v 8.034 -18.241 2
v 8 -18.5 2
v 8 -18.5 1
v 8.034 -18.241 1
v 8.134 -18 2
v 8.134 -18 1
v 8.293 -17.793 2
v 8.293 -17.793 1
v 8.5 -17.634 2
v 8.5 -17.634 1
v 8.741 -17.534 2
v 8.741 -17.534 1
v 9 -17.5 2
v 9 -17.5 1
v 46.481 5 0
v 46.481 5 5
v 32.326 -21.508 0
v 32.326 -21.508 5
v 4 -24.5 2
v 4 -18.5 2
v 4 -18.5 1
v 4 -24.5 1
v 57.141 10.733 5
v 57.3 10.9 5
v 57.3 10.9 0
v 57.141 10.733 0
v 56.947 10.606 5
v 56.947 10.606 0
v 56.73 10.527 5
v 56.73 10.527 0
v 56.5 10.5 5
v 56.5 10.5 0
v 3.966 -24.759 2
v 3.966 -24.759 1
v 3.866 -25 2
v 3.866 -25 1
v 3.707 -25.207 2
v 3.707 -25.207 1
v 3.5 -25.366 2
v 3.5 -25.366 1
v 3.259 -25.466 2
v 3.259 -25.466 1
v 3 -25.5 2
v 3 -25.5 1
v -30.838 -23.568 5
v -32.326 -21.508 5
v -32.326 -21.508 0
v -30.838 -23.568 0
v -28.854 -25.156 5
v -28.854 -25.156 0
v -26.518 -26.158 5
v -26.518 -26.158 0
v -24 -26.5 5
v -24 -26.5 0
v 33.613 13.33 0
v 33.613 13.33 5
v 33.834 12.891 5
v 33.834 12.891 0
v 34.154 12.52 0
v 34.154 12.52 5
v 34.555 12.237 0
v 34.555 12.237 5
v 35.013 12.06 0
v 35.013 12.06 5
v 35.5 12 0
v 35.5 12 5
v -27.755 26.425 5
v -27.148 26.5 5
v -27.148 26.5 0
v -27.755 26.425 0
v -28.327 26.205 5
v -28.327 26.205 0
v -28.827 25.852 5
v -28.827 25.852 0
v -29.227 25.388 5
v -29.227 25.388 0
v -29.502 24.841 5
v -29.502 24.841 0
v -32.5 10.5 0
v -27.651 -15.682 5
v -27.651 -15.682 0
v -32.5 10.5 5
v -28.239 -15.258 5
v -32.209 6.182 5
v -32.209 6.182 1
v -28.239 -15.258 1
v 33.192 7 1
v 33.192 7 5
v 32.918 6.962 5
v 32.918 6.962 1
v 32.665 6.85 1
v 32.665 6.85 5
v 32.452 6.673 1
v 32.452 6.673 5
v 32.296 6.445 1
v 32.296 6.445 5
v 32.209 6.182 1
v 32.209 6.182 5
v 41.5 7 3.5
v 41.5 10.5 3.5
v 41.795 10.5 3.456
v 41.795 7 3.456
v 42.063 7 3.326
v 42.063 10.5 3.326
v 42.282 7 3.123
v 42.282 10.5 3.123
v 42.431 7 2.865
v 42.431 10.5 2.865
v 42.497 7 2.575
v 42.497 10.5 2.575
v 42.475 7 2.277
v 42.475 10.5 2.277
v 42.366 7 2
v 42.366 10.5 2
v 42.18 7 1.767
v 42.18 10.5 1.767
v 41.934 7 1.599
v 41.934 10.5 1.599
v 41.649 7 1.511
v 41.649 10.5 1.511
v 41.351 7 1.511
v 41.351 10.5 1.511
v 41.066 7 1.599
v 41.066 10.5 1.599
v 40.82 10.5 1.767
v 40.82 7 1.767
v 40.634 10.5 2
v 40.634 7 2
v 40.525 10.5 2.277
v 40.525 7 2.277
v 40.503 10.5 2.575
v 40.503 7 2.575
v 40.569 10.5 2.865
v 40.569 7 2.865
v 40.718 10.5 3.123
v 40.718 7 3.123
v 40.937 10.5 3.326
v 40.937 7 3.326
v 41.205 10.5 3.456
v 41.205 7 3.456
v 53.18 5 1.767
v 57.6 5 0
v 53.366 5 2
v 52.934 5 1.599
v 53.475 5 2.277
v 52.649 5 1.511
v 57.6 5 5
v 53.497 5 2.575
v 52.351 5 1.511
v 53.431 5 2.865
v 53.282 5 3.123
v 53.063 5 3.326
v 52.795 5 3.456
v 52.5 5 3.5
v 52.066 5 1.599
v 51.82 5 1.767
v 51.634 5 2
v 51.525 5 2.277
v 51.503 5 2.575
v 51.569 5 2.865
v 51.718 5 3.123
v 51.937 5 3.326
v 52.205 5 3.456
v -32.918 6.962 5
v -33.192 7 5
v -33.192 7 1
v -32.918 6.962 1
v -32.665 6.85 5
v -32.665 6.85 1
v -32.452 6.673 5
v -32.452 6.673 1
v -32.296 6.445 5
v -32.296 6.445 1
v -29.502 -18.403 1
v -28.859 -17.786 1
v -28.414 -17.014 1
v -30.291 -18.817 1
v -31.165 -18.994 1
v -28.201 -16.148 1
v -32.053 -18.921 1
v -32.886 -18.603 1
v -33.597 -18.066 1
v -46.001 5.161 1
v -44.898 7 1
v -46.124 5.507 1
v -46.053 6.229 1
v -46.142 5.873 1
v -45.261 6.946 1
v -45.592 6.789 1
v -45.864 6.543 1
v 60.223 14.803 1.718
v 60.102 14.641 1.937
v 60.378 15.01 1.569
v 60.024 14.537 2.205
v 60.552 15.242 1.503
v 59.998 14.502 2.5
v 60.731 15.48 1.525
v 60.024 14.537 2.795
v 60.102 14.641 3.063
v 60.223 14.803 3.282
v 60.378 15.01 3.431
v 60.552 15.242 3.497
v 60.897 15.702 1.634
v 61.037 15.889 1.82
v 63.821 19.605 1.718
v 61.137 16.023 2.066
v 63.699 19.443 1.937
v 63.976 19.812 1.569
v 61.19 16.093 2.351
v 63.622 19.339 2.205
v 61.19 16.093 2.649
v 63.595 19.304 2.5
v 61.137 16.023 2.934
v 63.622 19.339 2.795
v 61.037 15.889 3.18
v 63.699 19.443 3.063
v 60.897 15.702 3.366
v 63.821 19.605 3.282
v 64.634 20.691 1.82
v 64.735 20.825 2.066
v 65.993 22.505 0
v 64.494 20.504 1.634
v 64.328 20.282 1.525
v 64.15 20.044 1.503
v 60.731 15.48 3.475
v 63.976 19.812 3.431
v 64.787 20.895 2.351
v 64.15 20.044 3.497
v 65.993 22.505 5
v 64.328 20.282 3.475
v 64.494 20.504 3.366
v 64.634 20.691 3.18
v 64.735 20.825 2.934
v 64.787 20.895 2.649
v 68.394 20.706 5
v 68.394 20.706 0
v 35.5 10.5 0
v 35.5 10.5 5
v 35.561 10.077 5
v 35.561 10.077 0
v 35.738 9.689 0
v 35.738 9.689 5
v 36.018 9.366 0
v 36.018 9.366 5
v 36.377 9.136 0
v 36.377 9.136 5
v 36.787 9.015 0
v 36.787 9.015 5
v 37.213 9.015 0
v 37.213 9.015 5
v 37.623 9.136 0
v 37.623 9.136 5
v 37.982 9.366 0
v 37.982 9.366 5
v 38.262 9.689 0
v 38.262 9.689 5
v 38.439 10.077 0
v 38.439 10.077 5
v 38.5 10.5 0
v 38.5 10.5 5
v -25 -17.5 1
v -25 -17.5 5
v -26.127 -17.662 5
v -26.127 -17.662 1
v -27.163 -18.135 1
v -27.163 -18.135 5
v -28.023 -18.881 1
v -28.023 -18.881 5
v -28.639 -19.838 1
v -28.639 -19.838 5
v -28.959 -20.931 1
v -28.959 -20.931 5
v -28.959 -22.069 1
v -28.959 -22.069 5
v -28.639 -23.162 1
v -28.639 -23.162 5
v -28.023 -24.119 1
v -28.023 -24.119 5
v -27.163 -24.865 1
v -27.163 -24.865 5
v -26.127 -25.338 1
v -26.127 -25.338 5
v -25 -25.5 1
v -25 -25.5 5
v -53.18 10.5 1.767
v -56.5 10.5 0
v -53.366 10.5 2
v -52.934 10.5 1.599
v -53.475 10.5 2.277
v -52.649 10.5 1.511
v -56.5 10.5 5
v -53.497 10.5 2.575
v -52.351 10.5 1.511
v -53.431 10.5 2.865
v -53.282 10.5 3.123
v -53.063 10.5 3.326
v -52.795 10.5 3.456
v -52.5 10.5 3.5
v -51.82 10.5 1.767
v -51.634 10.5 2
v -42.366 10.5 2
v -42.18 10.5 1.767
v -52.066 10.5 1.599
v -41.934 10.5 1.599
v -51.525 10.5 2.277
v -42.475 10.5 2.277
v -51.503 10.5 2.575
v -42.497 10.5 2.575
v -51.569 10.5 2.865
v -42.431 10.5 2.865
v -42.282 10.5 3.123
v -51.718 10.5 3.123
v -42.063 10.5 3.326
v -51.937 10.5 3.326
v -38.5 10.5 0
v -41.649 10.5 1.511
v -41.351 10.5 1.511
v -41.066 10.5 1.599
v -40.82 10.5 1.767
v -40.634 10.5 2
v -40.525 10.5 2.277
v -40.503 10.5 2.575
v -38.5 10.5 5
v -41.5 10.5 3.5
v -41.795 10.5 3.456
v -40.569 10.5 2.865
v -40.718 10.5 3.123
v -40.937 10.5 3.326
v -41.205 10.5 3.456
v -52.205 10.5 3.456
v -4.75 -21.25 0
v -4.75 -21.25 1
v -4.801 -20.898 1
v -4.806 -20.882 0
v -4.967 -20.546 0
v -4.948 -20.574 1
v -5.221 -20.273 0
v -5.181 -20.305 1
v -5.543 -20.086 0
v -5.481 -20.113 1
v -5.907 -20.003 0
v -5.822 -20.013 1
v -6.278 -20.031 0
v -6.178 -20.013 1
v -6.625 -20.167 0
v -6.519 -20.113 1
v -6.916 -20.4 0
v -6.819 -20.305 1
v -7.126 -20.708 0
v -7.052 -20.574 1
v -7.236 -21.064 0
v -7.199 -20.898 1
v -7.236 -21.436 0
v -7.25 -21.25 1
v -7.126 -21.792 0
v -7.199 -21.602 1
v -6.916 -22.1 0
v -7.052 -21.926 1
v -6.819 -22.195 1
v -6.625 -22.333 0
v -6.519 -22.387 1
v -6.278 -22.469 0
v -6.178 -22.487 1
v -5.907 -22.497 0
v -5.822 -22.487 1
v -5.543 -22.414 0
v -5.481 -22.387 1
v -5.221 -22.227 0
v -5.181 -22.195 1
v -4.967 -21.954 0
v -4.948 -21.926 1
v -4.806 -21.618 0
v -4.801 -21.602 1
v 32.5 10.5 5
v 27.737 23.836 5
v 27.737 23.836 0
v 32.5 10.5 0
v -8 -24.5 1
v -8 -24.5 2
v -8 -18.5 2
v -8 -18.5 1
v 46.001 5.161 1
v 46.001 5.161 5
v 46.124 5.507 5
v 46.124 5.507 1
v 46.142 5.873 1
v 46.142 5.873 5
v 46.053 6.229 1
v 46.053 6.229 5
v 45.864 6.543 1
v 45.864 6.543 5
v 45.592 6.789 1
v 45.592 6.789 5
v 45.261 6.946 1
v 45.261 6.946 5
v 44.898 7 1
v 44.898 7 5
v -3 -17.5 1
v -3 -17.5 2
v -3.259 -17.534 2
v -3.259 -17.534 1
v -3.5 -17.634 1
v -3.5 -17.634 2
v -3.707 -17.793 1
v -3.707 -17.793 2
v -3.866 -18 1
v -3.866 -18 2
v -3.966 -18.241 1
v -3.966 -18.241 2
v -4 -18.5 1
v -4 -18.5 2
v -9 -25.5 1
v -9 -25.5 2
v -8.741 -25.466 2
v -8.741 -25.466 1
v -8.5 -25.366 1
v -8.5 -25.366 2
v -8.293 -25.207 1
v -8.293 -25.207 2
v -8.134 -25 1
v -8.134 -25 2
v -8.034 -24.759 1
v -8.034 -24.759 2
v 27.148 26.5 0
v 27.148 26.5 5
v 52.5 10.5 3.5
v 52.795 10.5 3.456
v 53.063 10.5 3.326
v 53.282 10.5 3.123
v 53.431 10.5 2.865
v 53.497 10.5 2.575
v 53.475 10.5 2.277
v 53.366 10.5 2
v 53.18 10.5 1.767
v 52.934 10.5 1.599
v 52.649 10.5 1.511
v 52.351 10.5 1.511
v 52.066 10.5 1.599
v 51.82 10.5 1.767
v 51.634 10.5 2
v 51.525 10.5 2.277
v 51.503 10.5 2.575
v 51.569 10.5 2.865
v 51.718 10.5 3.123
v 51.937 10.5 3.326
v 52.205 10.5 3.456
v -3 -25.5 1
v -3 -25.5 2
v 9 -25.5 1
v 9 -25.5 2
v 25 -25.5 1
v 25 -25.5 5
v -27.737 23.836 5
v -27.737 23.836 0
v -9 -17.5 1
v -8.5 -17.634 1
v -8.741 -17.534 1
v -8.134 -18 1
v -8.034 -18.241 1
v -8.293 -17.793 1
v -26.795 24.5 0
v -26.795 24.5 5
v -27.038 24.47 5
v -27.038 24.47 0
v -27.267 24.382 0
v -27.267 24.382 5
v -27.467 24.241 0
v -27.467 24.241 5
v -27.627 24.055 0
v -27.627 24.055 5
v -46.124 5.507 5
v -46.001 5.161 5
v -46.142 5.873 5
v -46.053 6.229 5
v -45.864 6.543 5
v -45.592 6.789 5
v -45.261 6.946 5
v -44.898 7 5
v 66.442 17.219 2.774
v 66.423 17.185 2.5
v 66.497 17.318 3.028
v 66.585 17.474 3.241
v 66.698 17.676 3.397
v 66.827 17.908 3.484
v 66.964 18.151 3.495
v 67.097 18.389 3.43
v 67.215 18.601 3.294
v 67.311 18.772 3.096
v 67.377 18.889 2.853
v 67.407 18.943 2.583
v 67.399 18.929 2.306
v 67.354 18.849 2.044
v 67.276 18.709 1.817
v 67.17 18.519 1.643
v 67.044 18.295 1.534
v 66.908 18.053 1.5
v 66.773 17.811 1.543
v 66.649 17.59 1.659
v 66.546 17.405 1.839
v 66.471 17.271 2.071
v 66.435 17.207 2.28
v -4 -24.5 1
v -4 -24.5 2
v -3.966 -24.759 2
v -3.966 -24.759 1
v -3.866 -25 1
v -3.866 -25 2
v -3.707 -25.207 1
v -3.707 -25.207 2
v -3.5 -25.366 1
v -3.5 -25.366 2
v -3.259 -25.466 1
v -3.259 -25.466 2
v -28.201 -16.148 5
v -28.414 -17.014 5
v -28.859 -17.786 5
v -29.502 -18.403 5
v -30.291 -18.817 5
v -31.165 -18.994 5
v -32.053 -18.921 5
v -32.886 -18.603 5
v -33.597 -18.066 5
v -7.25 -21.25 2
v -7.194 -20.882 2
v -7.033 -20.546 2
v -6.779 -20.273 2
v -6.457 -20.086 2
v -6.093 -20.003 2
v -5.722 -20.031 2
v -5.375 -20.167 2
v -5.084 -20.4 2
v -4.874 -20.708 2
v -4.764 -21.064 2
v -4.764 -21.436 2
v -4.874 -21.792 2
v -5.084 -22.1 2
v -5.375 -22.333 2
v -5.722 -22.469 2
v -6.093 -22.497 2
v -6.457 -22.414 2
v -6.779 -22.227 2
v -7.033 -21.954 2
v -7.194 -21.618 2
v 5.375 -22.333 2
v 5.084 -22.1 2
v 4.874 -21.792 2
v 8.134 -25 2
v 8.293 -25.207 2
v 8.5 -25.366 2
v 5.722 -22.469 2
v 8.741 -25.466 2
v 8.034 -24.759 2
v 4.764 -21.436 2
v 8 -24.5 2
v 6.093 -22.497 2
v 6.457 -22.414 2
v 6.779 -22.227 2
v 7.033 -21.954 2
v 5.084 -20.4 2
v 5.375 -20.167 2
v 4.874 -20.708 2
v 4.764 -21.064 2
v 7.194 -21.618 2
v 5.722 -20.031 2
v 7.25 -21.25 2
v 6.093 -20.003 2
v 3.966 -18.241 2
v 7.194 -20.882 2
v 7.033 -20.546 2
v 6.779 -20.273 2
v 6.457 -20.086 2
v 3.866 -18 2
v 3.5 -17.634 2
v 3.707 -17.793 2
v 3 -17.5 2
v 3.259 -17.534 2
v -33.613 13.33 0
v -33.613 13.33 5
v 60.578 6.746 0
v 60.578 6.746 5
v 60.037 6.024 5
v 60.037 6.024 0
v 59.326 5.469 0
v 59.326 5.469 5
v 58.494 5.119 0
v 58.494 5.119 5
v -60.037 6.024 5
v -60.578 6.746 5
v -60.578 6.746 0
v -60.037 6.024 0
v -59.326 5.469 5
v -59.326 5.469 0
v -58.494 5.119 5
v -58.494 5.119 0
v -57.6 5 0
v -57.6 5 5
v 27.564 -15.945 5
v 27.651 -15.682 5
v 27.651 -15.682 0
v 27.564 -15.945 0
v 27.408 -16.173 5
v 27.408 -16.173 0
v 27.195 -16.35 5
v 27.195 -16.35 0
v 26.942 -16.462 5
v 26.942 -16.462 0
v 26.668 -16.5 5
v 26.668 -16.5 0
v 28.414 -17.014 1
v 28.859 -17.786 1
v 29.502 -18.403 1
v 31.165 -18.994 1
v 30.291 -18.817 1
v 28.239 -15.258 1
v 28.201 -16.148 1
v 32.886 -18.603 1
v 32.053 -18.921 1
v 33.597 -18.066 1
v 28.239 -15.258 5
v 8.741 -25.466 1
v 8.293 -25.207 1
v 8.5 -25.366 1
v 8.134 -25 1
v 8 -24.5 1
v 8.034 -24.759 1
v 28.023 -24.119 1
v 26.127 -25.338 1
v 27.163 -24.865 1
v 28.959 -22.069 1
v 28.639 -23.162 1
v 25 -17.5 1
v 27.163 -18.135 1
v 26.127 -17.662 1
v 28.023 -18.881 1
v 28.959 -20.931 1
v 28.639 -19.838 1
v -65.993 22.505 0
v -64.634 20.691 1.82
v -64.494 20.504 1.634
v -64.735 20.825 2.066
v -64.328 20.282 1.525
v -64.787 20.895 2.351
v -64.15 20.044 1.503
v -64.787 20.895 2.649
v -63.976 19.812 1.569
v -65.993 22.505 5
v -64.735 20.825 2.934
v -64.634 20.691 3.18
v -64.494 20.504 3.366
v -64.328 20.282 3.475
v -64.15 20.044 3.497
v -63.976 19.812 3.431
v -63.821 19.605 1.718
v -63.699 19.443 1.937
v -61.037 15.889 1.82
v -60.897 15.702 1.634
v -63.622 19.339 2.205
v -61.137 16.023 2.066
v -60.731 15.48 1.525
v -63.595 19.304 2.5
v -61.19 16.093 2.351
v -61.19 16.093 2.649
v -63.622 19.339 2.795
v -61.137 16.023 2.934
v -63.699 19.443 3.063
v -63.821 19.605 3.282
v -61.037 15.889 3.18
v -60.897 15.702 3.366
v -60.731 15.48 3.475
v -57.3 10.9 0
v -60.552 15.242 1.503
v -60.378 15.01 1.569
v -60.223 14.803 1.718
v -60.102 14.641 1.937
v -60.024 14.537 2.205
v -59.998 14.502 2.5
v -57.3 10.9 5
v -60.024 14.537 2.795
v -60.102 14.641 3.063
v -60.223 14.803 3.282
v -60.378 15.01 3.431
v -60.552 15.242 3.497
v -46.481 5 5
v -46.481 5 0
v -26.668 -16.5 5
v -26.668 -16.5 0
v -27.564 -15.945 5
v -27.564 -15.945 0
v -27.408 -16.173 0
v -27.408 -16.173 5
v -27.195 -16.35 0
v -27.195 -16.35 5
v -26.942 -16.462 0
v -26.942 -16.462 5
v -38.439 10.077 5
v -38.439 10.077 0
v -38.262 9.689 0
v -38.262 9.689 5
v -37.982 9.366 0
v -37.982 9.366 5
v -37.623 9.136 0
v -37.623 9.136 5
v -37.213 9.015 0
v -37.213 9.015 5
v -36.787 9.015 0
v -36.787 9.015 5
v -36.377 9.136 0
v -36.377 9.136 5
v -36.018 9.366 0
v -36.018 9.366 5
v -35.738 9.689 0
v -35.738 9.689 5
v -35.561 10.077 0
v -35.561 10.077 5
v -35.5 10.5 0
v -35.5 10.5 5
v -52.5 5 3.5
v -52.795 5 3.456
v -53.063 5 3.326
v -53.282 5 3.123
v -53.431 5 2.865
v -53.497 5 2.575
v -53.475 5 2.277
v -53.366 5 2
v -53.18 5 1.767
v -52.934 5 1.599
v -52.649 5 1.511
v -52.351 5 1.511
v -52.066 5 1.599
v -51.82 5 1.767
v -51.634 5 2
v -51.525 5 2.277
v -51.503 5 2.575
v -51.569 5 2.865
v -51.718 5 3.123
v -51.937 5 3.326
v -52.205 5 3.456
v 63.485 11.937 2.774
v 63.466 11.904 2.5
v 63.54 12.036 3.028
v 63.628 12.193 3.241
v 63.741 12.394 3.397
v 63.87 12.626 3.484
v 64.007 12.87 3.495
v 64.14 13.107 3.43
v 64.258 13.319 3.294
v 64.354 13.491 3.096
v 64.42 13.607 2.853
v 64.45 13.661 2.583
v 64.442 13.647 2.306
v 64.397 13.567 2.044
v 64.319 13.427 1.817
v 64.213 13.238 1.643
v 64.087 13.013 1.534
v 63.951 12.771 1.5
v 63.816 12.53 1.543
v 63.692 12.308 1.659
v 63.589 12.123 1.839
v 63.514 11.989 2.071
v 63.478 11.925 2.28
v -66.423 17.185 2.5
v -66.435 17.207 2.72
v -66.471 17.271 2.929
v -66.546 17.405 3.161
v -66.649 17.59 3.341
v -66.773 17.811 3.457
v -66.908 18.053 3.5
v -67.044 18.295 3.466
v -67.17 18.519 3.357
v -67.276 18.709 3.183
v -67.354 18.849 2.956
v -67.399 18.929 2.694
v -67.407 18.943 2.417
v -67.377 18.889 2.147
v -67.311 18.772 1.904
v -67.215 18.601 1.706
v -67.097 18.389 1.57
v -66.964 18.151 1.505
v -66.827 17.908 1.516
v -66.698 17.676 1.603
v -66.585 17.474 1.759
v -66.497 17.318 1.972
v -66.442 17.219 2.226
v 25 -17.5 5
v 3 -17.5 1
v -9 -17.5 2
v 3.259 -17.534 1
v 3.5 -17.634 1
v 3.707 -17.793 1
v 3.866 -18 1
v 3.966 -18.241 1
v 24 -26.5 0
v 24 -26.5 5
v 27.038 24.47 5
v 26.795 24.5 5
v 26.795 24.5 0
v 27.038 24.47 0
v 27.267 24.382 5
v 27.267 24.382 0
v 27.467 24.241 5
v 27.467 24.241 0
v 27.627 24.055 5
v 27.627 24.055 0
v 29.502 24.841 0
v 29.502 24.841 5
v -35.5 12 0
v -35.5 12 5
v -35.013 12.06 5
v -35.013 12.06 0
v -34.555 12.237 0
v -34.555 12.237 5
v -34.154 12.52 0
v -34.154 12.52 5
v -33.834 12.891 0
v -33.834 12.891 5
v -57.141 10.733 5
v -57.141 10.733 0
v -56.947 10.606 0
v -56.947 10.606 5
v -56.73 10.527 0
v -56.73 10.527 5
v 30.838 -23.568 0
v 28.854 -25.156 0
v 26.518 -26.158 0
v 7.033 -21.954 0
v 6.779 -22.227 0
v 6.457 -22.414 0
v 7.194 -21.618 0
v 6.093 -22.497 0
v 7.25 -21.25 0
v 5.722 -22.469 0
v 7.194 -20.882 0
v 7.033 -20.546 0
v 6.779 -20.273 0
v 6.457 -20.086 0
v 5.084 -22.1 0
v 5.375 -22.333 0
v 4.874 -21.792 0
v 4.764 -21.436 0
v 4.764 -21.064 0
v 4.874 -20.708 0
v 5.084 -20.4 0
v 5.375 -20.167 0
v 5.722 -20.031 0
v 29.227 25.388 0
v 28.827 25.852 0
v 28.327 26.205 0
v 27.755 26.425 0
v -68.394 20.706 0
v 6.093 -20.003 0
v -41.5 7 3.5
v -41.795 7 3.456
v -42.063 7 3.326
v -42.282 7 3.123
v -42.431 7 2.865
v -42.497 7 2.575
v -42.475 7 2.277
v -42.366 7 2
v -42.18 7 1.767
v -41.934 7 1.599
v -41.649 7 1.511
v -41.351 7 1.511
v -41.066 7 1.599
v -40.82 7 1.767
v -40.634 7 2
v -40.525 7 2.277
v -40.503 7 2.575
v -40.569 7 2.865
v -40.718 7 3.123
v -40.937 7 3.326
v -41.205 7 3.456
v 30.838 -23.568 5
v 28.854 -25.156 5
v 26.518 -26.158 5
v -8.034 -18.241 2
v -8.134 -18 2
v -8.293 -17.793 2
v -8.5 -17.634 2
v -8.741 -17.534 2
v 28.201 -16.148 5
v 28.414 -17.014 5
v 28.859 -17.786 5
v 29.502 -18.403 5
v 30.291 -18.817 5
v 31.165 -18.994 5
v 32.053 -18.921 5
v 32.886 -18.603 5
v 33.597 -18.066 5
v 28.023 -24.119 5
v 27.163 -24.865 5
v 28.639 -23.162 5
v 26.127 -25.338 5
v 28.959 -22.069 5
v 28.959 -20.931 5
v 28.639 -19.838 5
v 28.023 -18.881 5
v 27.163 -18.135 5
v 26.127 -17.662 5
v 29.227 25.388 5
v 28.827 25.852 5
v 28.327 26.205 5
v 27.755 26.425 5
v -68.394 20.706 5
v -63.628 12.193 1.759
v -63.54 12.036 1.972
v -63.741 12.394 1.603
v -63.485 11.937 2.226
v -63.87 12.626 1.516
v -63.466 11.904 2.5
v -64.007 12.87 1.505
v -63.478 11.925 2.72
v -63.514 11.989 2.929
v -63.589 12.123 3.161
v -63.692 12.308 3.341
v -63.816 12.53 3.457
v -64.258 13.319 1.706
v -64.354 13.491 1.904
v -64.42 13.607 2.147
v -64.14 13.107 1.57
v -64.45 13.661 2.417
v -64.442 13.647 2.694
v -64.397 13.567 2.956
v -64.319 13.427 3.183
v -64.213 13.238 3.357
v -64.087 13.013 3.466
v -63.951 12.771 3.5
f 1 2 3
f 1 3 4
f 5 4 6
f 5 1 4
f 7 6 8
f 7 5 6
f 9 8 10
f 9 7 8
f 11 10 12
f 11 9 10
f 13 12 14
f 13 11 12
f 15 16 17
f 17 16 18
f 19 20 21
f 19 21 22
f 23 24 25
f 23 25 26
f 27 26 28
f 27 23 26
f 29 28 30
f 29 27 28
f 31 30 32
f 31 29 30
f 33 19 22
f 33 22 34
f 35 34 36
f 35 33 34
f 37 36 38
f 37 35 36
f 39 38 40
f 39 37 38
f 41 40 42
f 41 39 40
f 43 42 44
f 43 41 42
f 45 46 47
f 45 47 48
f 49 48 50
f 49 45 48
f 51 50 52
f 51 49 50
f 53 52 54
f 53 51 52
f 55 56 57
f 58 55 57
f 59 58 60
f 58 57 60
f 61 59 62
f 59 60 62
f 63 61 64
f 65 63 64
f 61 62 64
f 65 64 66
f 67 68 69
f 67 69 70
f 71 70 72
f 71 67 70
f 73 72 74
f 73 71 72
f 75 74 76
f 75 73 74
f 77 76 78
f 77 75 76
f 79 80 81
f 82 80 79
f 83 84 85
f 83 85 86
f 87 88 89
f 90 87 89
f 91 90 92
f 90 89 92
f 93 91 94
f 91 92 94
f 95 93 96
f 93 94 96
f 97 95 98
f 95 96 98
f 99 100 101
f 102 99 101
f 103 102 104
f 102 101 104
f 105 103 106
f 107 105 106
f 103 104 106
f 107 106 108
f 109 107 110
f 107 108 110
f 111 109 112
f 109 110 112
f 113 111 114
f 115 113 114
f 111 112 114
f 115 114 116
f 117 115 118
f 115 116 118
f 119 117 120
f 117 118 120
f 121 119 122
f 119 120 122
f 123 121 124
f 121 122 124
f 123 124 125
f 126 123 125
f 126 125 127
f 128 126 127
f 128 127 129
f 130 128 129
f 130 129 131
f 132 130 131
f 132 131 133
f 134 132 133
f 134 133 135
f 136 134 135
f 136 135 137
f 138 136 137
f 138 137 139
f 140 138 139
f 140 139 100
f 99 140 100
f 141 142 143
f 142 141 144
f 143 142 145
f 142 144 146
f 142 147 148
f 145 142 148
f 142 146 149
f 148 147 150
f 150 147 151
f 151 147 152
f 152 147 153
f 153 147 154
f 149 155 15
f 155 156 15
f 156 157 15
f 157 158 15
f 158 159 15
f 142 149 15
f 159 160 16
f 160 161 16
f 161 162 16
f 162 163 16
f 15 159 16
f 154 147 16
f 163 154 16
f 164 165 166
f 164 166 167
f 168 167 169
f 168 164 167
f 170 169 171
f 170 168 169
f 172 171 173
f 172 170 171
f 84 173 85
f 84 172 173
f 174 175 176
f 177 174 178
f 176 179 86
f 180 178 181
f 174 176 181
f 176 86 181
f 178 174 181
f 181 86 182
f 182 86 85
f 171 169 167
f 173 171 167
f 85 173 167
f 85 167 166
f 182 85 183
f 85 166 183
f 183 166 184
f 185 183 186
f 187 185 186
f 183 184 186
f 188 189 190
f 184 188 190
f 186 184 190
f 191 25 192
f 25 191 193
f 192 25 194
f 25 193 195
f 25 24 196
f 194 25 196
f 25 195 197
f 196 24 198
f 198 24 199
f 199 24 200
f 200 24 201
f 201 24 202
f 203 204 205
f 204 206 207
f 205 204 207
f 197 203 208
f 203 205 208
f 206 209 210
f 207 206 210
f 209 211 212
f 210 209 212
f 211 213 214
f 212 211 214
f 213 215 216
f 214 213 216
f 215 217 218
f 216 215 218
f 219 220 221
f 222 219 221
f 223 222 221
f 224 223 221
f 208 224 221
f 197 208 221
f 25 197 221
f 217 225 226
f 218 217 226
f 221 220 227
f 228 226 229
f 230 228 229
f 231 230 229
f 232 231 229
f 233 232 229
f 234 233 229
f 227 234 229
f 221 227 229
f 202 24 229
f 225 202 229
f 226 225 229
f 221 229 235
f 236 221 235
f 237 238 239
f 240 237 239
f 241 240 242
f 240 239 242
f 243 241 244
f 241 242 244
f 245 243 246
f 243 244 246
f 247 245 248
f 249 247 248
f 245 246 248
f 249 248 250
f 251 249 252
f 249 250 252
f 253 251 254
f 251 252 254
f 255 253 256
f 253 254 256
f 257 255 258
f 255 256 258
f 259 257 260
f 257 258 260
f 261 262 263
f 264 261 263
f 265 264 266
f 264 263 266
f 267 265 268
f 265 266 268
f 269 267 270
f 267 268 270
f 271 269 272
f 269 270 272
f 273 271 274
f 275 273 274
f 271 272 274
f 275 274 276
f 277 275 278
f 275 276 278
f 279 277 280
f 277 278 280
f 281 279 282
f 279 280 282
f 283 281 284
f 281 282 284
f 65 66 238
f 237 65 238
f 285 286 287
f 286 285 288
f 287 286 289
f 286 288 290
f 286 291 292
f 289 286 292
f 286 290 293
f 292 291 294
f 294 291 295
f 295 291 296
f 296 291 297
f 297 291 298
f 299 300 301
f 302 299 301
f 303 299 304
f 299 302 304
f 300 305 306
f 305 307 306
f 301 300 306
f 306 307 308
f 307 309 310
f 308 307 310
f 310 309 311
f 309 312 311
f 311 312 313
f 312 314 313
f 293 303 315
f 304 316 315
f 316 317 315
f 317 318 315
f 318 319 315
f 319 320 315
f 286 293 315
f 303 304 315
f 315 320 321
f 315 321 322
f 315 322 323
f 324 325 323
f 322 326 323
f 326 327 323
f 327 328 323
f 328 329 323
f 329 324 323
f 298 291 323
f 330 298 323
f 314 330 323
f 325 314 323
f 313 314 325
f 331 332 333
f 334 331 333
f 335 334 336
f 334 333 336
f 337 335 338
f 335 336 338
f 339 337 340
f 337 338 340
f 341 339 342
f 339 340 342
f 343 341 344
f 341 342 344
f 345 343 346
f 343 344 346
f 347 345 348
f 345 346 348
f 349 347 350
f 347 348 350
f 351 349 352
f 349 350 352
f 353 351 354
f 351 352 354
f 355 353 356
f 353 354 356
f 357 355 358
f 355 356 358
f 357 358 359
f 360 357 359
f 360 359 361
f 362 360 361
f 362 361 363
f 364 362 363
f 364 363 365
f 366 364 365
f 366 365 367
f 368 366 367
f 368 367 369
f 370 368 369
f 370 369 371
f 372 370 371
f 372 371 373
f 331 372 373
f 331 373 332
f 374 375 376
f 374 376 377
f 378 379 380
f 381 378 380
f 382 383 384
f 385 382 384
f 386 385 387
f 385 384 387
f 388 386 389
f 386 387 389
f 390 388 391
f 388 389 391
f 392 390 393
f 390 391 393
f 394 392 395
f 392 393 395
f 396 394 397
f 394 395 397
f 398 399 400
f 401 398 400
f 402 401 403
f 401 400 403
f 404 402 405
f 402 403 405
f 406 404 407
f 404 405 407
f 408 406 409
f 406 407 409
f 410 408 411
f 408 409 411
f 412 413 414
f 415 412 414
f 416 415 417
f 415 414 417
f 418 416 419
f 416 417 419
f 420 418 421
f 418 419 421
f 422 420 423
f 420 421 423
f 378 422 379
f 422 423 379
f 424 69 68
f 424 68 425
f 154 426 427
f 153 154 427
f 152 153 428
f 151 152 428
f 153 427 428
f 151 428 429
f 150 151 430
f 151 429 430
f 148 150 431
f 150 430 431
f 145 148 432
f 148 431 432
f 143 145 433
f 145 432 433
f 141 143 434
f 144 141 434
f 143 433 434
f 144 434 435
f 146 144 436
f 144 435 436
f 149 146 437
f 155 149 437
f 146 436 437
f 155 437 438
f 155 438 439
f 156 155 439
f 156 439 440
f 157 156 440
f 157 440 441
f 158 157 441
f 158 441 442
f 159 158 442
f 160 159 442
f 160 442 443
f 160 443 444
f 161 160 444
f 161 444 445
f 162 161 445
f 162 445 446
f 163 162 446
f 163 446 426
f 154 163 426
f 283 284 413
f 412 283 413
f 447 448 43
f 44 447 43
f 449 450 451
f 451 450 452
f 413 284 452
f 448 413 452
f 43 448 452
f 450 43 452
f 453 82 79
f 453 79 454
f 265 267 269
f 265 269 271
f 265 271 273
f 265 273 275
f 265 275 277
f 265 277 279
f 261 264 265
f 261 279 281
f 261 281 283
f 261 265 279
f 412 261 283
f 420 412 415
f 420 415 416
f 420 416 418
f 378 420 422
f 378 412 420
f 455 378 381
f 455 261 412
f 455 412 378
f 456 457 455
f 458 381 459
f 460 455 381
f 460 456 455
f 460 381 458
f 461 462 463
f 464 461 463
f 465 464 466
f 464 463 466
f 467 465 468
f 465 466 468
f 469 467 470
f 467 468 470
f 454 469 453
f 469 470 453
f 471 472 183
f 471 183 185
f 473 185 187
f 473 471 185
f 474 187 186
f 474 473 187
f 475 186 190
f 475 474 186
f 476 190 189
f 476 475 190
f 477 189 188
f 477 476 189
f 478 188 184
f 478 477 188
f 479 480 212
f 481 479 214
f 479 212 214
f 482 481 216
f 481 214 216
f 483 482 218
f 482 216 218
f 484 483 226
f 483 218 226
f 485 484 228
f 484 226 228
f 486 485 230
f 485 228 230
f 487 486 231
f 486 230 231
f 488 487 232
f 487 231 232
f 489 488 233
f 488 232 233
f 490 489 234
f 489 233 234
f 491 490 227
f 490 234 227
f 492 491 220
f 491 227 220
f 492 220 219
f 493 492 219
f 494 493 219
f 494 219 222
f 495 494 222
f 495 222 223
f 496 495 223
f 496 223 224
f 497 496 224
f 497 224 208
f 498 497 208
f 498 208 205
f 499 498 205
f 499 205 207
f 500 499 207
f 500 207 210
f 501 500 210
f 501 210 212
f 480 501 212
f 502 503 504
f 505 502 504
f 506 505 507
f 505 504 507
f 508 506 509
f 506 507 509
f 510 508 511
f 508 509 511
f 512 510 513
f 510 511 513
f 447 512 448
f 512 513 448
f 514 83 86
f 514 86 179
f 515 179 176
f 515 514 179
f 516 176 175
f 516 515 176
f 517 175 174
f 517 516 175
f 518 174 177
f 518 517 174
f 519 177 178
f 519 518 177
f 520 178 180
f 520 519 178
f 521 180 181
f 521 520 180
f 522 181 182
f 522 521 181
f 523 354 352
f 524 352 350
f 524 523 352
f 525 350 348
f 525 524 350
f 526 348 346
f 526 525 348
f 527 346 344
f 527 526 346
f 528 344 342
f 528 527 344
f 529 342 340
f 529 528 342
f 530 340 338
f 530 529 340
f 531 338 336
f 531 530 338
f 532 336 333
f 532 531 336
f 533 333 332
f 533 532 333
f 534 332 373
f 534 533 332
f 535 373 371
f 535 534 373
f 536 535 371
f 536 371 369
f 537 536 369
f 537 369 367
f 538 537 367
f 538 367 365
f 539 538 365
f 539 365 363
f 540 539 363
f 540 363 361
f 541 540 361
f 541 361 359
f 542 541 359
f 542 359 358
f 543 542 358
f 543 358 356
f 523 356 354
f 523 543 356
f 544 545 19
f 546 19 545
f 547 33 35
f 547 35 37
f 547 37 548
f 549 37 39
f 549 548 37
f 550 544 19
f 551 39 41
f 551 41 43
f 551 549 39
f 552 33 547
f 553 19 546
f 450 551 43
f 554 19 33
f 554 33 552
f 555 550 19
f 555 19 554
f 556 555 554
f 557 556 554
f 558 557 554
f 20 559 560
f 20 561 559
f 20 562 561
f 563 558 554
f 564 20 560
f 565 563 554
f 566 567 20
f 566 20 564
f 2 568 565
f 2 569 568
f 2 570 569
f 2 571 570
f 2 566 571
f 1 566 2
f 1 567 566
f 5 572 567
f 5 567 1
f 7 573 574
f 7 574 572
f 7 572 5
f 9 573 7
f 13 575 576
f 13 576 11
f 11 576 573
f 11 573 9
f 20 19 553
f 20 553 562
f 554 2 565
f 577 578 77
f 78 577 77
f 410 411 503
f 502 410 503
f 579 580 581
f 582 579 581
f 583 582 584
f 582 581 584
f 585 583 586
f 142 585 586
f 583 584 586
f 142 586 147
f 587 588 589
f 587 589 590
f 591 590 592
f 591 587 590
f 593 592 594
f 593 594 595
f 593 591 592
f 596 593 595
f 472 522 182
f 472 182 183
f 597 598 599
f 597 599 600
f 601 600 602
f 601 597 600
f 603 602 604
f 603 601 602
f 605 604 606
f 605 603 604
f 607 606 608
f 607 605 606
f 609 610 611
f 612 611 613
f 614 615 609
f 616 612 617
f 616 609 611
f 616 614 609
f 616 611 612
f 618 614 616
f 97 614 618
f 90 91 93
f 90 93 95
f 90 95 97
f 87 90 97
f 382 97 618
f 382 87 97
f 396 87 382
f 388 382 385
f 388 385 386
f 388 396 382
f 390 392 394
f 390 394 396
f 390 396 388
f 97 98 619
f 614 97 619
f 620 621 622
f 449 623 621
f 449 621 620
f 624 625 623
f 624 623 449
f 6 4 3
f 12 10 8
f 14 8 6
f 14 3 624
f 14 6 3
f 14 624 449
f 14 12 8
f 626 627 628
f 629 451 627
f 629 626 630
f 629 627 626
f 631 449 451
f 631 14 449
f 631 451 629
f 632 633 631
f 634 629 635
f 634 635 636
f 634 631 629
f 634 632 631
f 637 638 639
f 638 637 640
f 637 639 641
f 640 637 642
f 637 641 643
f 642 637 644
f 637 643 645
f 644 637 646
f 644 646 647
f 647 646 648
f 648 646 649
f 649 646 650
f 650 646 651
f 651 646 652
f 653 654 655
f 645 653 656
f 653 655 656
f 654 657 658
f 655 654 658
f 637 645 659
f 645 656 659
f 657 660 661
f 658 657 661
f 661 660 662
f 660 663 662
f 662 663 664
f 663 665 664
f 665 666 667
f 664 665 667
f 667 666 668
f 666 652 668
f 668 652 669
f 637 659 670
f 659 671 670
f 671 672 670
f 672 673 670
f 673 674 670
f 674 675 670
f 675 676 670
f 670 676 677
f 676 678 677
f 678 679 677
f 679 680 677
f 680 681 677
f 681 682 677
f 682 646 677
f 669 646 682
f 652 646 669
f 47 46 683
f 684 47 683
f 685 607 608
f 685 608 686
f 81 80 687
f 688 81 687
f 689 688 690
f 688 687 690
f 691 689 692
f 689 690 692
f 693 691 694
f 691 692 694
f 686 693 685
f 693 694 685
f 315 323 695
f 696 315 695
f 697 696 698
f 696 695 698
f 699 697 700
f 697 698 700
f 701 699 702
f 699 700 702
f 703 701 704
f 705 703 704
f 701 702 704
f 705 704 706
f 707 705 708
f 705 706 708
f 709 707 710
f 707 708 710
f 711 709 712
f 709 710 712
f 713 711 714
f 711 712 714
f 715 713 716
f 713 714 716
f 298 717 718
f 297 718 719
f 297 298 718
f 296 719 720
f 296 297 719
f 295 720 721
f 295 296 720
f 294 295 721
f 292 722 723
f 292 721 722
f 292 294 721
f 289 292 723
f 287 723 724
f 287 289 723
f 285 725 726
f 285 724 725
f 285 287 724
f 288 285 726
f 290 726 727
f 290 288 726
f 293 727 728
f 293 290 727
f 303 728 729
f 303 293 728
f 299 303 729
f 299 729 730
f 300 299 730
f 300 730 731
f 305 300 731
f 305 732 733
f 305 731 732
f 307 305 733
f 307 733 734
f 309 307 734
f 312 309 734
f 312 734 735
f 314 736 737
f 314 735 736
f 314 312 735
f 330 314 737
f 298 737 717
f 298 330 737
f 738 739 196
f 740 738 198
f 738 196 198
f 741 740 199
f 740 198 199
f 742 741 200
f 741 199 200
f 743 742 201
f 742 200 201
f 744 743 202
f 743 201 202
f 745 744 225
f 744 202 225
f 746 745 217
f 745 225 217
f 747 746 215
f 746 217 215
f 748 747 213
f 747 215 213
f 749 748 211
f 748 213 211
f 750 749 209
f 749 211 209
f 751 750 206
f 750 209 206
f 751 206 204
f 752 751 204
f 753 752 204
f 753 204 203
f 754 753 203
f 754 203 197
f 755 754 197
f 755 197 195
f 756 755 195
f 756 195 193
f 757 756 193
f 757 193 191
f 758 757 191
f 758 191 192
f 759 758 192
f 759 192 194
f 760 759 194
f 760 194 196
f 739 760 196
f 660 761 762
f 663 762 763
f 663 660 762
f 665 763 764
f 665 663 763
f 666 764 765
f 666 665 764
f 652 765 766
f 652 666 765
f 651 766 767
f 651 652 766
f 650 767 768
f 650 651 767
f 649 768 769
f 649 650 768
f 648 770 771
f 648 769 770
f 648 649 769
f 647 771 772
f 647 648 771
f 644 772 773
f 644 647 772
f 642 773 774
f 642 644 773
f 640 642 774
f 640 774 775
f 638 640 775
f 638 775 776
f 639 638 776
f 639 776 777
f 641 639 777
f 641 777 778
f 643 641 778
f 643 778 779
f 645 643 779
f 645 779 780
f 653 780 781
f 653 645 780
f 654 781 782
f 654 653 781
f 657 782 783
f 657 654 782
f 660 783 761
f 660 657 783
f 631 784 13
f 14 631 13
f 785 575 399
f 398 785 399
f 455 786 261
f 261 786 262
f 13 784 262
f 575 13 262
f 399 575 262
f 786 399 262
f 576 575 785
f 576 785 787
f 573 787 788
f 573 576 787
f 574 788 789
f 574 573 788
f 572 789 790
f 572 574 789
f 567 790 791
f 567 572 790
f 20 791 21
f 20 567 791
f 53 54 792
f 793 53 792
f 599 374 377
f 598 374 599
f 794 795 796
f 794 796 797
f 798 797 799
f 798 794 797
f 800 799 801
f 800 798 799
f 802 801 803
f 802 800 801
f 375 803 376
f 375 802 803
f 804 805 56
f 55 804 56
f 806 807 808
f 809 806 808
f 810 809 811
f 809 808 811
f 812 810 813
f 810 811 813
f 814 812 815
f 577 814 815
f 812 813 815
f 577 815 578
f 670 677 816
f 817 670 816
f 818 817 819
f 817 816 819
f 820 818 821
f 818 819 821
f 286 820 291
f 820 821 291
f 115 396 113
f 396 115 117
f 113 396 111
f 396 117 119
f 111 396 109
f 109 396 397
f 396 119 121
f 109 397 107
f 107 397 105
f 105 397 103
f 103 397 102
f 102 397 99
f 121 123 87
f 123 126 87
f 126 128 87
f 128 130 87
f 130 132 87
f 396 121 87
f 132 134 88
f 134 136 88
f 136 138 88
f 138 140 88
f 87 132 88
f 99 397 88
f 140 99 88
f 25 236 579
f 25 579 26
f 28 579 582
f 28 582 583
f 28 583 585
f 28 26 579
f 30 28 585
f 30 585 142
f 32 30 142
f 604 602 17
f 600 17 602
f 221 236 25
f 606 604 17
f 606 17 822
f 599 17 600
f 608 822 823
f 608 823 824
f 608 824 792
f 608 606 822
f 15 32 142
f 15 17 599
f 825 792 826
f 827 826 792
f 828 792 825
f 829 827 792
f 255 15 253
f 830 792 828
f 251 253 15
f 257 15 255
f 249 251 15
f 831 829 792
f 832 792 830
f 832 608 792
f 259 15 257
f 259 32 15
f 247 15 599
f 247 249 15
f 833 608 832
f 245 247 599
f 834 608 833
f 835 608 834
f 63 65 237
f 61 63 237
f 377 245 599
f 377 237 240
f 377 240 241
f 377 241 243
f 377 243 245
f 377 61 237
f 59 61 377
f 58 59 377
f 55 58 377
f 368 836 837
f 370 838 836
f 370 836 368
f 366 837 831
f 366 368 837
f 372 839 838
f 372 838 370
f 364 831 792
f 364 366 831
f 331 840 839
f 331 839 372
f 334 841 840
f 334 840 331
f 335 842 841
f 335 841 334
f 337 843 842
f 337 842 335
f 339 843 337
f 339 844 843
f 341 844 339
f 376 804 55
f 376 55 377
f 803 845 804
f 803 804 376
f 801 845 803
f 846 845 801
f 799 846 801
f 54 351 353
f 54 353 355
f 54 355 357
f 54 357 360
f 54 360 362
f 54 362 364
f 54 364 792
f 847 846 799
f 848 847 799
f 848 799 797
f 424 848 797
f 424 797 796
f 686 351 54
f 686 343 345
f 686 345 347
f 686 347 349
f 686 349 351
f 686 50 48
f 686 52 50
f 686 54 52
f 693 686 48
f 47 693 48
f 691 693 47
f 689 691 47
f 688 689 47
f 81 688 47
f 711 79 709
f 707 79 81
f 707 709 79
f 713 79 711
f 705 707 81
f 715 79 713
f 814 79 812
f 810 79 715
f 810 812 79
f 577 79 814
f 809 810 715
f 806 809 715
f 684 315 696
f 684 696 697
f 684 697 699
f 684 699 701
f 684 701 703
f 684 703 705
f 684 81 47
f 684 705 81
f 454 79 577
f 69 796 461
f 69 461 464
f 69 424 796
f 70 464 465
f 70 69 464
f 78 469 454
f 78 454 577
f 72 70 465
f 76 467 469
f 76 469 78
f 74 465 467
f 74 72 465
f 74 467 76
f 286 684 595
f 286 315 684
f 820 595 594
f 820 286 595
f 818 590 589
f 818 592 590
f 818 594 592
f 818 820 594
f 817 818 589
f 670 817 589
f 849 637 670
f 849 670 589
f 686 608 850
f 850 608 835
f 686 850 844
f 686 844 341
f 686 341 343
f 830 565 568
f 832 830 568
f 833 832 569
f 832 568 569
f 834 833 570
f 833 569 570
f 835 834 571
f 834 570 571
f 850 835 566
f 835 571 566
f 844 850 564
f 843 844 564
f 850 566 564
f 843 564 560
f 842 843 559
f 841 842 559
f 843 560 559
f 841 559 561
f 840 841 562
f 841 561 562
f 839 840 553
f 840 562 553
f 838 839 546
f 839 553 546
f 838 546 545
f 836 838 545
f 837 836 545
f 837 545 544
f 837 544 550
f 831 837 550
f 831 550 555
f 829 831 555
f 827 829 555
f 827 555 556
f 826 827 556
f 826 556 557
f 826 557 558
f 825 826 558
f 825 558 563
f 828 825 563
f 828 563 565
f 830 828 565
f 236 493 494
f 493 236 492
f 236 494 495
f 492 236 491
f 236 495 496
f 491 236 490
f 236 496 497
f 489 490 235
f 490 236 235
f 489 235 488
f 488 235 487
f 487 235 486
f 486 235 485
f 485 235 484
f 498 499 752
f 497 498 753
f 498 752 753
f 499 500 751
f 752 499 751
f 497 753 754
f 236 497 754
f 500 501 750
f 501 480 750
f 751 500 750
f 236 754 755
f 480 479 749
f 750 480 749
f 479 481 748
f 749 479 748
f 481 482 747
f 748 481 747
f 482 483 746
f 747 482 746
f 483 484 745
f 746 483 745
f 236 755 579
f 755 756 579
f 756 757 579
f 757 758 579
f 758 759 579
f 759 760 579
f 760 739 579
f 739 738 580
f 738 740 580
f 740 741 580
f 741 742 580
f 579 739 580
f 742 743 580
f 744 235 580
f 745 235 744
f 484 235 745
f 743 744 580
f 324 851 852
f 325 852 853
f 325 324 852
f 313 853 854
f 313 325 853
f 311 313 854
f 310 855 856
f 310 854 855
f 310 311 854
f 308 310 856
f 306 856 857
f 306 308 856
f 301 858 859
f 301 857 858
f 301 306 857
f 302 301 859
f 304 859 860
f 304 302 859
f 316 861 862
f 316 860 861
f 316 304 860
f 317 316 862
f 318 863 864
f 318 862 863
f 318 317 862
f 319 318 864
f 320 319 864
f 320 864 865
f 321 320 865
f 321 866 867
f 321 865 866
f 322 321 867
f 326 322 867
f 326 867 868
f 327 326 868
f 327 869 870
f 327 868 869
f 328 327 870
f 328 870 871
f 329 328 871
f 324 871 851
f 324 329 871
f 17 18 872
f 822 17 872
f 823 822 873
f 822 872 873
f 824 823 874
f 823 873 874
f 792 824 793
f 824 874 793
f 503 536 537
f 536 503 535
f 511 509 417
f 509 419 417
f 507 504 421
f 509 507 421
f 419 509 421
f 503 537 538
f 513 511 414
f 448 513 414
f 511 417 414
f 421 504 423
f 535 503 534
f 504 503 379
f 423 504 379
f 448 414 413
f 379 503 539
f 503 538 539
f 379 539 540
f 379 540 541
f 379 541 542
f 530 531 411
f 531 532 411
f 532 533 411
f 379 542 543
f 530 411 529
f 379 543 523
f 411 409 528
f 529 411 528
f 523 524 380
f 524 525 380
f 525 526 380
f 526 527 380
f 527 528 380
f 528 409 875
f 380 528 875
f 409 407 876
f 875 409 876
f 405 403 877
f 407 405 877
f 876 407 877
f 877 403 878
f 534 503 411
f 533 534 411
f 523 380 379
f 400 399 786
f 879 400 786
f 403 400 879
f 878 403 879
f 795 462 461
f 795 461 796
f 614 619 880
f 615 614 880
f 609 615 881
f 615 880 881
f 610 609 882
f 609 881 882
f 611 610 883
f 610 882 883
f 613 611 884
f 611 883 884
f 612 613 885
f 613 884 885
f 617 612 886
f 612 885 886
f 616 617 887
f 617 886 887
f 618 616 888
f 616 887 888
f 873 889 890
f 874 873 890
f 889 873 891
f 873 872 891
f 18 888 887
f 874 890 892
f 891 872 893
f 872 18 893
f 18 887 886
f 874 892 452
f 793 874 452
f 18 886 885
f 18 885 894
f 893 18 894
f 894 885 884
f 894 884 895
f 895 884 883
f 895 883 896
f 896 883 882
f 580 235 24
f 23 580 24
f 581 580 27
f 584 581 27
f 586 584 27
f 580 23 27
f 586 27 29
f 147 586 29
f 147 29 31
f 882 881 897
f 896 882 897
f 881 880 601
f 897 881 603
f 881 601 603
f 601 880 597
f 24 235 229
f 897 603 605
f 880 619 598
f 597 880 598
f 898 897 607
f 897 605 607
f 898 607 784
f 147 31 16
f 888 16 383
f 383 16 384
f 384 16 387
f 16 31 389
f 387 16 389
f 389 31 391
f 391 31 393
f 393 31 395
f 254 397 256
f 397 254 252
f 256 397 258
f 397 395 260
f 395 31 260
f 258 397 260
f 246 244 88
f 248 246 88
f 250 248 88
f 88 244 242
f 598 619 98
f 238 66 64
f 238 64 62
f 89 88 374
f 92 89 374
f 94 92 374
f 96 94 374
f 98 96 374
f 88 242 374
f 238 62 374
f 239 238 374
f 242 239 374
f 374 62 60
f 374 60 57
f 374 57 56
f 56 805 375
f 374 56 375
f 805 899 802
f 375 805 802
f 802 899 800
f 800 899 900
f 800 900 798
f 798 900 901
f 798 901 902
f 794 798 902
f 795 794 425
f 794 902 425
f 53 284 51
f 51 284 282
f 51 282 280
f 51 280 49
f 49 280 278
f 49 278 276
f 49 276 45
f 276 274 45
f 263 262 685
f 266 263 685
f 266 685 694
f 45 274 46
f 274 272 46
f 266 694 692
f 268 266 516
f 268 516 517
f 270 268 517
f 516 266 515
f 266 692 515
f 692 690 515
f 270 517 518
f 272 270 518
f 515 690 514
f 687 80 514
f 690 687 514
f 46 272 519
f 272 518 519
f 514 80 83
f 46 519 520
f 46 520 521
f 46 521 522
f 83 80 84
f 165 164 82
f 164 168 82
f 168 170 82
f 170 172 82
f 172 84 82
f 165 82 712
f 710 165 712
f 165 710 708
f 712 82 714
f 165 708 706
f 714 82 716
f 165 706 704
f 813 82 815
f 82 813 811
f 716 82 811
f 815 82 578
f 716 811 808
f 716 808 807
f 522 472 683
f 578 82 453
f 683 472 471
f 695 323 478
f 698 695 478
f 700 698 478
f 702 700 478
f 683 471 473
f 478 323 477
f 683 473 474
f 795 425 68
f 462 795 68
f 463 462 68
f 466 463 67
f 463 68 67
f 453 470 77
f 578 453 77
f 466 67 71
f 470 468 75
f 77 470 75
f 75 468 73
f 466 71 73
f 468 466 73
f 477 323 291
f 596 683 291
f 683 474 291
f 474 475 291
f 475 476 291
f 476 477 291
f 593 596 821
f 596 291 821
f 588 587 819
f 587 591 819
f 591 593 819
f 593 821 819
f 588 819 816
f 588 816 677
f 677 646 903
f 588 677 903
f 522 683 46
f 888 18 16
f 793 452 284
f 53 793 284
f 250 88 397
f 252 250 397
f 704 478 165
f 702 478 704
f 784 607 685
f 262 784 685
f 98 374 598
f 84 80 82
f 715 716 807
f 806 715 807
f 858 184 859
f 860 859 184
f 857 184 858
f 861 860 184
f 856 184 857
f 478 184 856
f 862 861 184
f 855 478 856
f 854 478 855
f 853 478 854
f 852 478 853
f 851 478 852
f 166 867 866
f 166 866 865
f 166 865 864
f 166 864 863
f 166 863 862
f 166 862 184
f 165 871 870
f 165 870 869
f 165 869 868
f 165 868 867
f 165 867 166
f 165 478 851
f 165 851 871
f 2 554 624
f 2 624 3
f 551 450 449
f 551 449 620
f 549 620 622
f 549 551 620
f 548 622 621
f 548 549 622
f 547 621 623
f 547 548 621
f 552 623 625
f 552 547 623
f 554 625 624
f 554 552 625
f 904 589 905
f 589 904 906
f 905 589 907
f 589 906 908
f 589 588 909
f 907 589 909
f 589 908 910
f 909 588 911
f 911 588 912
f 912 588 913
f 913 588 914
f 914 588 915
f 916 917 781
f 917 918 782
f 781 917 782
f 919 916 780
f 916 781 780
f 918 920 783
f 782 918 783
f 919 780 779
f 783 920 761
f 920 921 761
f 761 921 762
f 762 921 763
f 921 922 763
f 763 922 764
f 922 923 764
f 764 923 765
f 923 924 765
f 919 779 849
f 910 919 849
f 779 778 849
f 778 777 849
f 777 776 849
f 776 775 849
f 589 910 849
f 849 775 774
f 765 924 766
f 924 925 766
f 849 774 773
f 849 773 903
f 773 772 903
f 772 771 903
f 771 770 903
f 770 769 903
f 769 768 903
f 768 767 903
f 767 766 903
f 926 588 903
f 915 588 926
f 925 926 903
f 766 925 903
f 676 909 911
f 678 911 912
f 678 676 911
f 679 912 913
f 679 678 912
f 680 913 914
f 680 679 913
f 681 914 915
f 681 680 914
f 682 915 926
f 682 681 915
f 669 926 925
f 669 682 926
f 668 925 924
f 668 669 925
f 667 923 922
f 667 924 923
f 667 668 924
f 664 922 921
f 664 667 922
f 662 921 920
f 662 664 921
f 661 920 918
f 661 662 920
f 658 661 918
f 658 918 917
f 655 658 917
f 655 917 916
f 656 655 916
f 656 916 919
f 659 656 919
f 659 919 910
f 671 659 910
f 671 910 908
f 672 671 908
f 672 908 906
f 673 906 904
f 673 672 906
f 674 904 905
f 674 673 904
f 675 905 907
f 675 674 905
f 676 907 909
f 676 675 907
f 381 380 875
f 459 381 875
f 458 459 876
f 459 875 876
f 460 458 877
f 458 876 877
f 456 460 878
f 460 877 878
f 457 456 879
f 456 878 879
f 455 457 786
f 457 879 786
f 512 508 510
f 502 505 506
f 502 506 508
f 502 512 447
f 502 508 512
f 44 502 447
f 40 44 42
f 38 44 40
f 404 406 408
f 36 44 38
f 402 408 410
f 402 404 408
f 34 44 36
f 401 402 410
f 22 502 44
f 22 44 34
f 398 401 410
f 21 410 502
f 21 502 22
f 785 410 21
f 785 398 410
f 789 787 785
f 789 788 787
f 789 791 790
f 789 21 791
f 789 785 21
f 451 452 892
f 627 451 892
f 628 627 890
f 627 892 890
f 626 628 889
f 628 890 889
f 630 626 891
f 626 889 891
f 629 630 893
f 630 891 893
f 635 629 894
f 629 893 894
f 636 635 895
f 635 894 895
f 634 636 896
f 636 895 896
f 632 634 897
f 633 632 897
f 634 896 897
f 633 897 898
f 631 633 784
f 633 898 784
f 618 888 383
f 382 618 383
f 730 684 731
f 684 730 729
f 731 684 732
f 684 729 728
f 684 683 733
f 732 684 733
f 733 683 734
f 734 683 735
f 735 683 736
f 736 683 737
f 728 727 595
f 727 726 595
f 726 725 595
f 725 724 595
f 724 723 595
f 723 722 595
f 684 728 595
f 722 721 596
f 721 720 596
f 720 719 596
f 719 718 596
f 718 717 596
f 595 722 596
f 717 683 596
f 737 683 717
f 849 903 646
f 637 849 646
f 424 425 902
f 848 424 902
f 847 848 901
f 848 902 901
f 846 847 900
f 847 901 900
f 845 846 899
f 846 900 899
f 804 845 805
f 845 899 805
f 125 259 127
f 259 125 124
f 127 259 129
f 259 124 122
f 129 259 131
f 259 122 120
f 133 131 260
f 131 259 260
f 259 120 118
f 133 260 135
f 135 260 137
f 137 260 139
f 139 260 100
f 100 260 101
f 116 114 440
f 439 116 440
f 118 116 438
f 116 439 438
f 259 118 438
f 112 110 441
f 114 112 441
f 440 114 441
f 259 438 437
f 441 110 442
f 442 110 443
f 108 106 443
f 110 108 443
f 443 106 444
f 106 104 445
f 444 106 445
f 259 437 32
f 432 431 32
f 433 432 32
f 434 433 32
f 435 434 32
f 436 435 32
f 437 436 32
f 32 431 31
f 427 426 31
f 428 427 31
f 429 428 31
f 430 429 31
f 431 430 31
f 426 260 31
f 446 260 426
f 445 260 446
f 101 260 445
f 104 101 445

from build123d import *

# Parameters (mm, degrees)
CROQUIS1_W              = 138
CROQUIS1_H              = 53
SALIENTE_EXTRUIR1_DEPTH = 5
CROQUIS2_R              = 2.003620998
CROQUIS2_R_2            = 1.5
CROQUIS2_R_3            = 1.25
PRINCIPAL_DEPTH         = 5
CORTAR_EXTRUIR2_DEPTH   = 5
SALIENTE_EXTRUIR2_DEPTH = 5
CORTAR_EXTRUIR3_DEPTH   = 4
CROQUIS6_R              = 4
CORTAR_EXTRUIR4_DEPTH   = 4
SALIENTE_EXTRUIR3_START = 1
CROQUIS8_R              = 1.25
SALIENTE_EXTRUIR3_DEPTH = 1
CROQUIS9_R              = 1
CORTAR_EXTRUIR5_DEPTH   = 10
CROQUIS10_R             = 1
CORTAR_EXTRUIR6_DEPTH   = 10


with BuildPart() as part:
    # Croquis1 → Saliente-Extruir1 (new body)
    with BuildSketch(Plane.XY):
        Rectangle(CROQUIS1_W, CROQUIS1_H)
    extrude(amount=SALIENTE_EXTRUIR1_DEPTH)

    # Croquis2 → Principal (cut)
    with BuildSketch(Plane.XY.offset(5)):
        Polygon((-27.5, -16.5), (-32.5, 10.5), (-27.5, 24.5), (27.5, 24.5), (32.5, 10.5), (27.5, -16.5), align=None)
        with BuildLine():
            Line((-33.613106132, 13.32973033), (-28.909438392, 26.5))
            Line((-28.909438392, 26.5), (-69, 26.5))
            Line((-69, 26.5), (-69, -26.5))
            Line((-69, -26.5), (-29.659776055, -26.5))
            Line((-29.659776055, -26.5), (-46.481481481, 5))
            Line((-46.481481481, 5), (-59.600761168, 5))
            Line((-59.600761168, 5), (-68.394256163, 20.706415948))
            Line((-68.394256163, 20.706415948), (-65.993243243, 22.505064597))
            Line((-65.993243243, 22.505064597), (-57, 10.5))
            Line((-57, 10.5), (-38.5, 10.5))
            ThreePointArc((-38.5, 10.5), (-37, 12), (-35.5, 10.5))
            Line((-35.5, 10.5), (-35.5, 12))
            ThreePointArc((-35.5, 12), (-36.916773994, 15.420394992), (-33.496379002, 14.003620998))
            ThreePointArc((-33.496379002, 14.003620998), (-33.525776447, 13.661658334), (-33.613106132, 13.32973033))
        make_face()
        with BuildLine():
            Line((28.909438392, 26.5), (33.613106132, 13.32973033))
            ThreePointArc((33.613106132, 13.32973033), (35.158037336, 15.977844551), (37.503620998, 14.003620998))
            ThreePointArc((37.503620998, 14.003620998), (36.916773994, 12.586847003), (35.5, 12))
            Line((35.5, 12), (35.5, 10.5))
            ThreePointArc((35.5, 10.5), (37, 12), (38.5, 10.5))
            Line((38.5, 10.5), (57, 10.5))
            Line((57, 10.5), (65.993243243, 22.505064597))
            Line((65.993243243, 22.505064597), (68.394256163, 20.706415948))
            Line((68.394256163, 20.706415948), (59.600761168, 5))
            Line((59.600761168, 5), (46.481481481, 5))
            Line((46.481481481, 5), (29.659776055, -26.5))
            Line((29.659776055, -26.5), (69, -26.5))
            Line((69, -26.5), (69, 26.5))
            Line((69, 26.5), (28.909438392, 26.5))
        make_face()
        with Locations((-35.5, 14.003620998)):
            Circle(CROQUIS2_R)
        with Locations((35.5, 14.003620998)):
            Circle(CROQUIS2_R)
        with Locations((37, 10.5)):
            Circle(CROQUIS2_R_2)
        with Locations((-37, 10.5)):
            Circle(CROQUIS2_R_2)
        with Locations((-6, -21.25)):
            Circle(CROQUIS2_R_3)
        with Locations((6, -21.25)):
            Circle(CROQUIS2_R_3)
    extrude(amount=-PRINCIPAL_DEPTH, mode=Mode.SUBTRACT)

    # Croquis3 → Cortar-Extruir2 (cut)
    with BuildSketch(Plane.XY.offset(5)):
        with BuildLine():
            ThreePointArc((32.325878128, -21.50750886), (28.853998723, -25.156220871), (24, -26.5))
            Line((24, -26.5), (29.659776055, -26.5))
            Line((29.659776055, -26.5), (32.325878128, -21.50750886))
        make_face()
        with BuildLine():
            ThreePointArc((60.578021878, 6.745524755), (59.326103094, 5.468546056), (57.600287393, 5))
            Line((57.600287393, 5), (59.600761168, 5))
            Line((59.600761168, 5), (60.578021878, 6.745524755))
        make_face()
        with BuildLine():
            Line((28.909438392, 26.5), (27.147640402, 26.5))
            ThreePointArc((27.147640402, 26.5), (28.587761459, 26.043538926), (29.501995152, 24.840841072))
            Line((29.501995152, 24.840841072), (28.909438392, 26.5))
        make_face()
    cortar_extruir2 = extrude(amount=-CORTAR_EXTRUIR2_DEPTH, mode=Mode.SUBTRACT)

    # Simetría2: Cortar-Extruir2 across plane
    add(cortar_extruir2.mirror(Plane(origin=(0, 0, 0), x_dir=(0, 0, 1), z_dir=(1, 0, 0))), mode=Mode.SUBTRACT)

    # Croquis4 → Saliente-Extruir2 (add)
    with BuildSketch(Plane.XY.offset(5)):
        with BuildLine():
            ThreePointArc((27.651464932, -15.682089366), (27.30767909, -16.268794305), (26.668182947, -16.5))
            Line((26.668182947, -16.5), (27.5, -16.5))
            Line((27.5, -16.5), (27.651464932, -15.682089366))
        make_face()
        with BuildLine():
            ThreePointArc((26.795280804, 24.5), (27.371329386, 24.317415458), (27.737022835, 23.836336061))
            Line((27.737022835, 23.836336061), (27.5, 24.5))
            Line((27.5, 24.5), (26.795280804, 24.5))
        make_face()
        with BuildLine():
            ThreePointArc((57.299985699, 10.900450382), (56.947113406, 10.605698704), (56.49964811, 10.5))
            Line((56.49964811, 10.5), (57, 10.5))
            Line((57, 10.5), (57.299985699, 10.900450382))
        make_face()
    saliente_extruir2 = extrude(amount=-SALIENTE_EXTRUIR2_DEPTH)

    # Simetría3: Saliente-Extruir2 across plane
    add(saliente_extruir2.mirror(Plane(origin=(0, 0, 0), x_dir=(0, 0, 1), z_dir=(1, 0, 0))))

    # Croquis5 → Cortar-Extruir3 (cut)
    with BuildSketch(Plane.XY.offset(5)):
        with BuildLine():
            Line((32.208888015, 6.182089238), (28.238577223, -15.257589037))
            ThreePointArc((28.238577223, -15.257589037), (29.881835098, -18.638168181), (33.596848928, -18.066080749))
            Line((33.596848928, -18.066080749), (46.000722714, 5.161173227))
            ThreePointArc((46.000722714, 5.161173227), (45.970135784, 6.392832223), (44.898097197, 7))
            Line((44.898097197, 7), (33.192170024, 7))
            ThreePointArc((33.192170024, 7), (32.552673831, 6.768794263), (32.208888015, 6.182089238))
        make_face()
    cortar_extruir3 = extrude(amount=-CORTAR_EXTRUIR3_DEPTH, mode=Mode.SUBTRACT)

    # Simetría4: Cortar-Extruir3 across plane
    add(cortar_extruir3.mirror(Plane(origin=(0, 0, 0), x_dir=(0, 0, 1), z_dir=(1, 0, 0))), mode=Mode.SUBTRACT)

    # Croquis6 → Cortar-Extruir4 (cut)
    with BuildSketch(Plane.XY.offset(5)):
        with Locations((-25, -21.5)):
            Circle(CROQUIS6_R)
        with BuildLine():
            Line((25, -17.5), (-25, -17.5))
            ThreePointArc((-25, -17.5), (-22.171572875, -18.671572875), (-21, -21.5))
            ThreePointArc((-21, -21.5), (-22.171572875, -24.328427125), (-25, -25.5))
            Line((-25, -25.5), (25, -25.5))
            ThreePointArc((25, -25.5), (21, -21.5), (25, -17.5))
        make_face()
        with Locations((25, -21.5)):
            Circle(CROQUIS6_R)
    extrude(amount=-CORTAR_EXTRUIR4_DEPTH, mode=Mode.SUBTRACT)

    # Croquis8 → Saliente-Extruir3 (add)
    # profile 1 of 5: a face of its own
    with BuildSketch(Plane.XY.offset(1).offset(SALIENTE_EXTRUIR3_START)):
        with BuildLine():
            Line((4, -18.5), (4, -17.5))
            Line((4, -17.5), (3, -17.5))
            ThreePointArc((3, -17.5), (3.707106781, -17.792893219), (4, -18.5))
        make_face()
    # profile 2 of 5: a face of its own
    with BuildSketch(Plane.XY.offset(1).offset(SALIENTE_EXTRUIR3_START)):
        Polygon((8, -17.5), (4, -17.5), (4, -18.5), (4, -24.5), (4, -25.5), (8, -25.5), (8, -24.5), (8, -18.5), align=None)
        with Locations((6, -21.25)):
            Circle(CROQUIS8_R, mode=Mode.SUBTRACT)
    # profile 3 of 5: a face of its own
    with BuildSketch(Plane.XY.offset(1).offset(SALIENTE_EXTRUIR3_START)):
        with BuildLine():
            Line((9, -17.5), (8, -17.5))
            Line((8, -17.5), (8, -18.5))
            ThreePointArc((8, -18.5), (8.292893219, -17.792893219), (9, -17.5))
        make_face()
    # profile 4 of 5: a face of its own
    with BuildSketch(Plane.XY.offset(1).offset(SALIENTE_EXTRUIR3_START)):
        with BuildLine():
            ThreePointArc((9, -25.5), (8.292893219, -25.207106781), (8, -24.5))
            Line((8, -24.5), (8, -25.5))
            Line((8, -25.5), (9, -25.5))
        make_face()
    # profile 5 of 5: a face of its own
    with BuildSketch(Plane.XY.offset(1).offset(SALIENTE_EXTRUIR3_START)):
        with BuildLine():
            Line((4, -25.5), (4, -24.5))
            ThreePointArc((4, -24.5), (3.707106781, -25.207106781), (3, -25.5))
            Line((3, -25.5), (4, -25.5))
        make_face()
    saliente_extruir3 = extrude(amount=-SALIENTE_EXTRUIR3_DEPTH)

    # Simetría5: Saliente-Extruir3 across plane
    add(saliente_extruir3.mirror(Plane(origin=(0, 0, 0), x_dir=(0, 0, 1), z_dir=(1, 0, 0))))

    # Croquis9 → Cortar-Extruir5 (cut)
    with BuildSketch(Plane(origin=(31.472457495, -23.576671616, 0), x_dir=(0, 0, 1), z_dir=(-0.8003376397714477, 0.5995495495495503, 0))):
        with Locations(Location((2.5, 54.577869542, 0), (0, 0, 270))):
            Circle(CROQUIS9_R)
        with Locations(Location((2.5, 48.577869542, 0), (0, 0, 270))):
            Circle(CROQUIS9_R)
    cortar_extruir5 = extrude(amount=-CORTAR_EXTRUIR5_DEPTH, mode=Mode.SUBTRACT)

    # Simetría6: Cortar-Extruir5 across plane
    add(cortar_extruir5.mirror(Plane(origin=(0, 0, 0), x_dir=(0, 0, 1), z_dir=(1, 0, 0))), mode=Mode.SUBTRACT)

    # Croquis10 → Cortar-Extruir6 (cut)
    with BuildSketch(Plane(origin=(0, 10.5, 0), x_dir=(1, 0, 0), z_dir=(0, 1, 0))):
        with Locations(Location((52.5, -2.5, 0), (0, 0, 270))):
            Circle(CROQUIS10_R)
        with Locations(Location((41.5, -2.5, 0), (0, 0, 270))):
            Circle(CROQUIS10_R)
    cortar_extruir6 = extrude(amount=-CORTAR_EXTRUIR6_DEPTH, mode=Mode.SUBTRACT)

    # Simetría7: Cortar-Extruir6 across plane
    add(cortar_extruir6.mirror(Plane(origin=(0, 0, 0), x_dir=(0, 0, 1), z_dir=(1, 0, 0))), mode=Mode.SUBTRACT)


solid = part.part
